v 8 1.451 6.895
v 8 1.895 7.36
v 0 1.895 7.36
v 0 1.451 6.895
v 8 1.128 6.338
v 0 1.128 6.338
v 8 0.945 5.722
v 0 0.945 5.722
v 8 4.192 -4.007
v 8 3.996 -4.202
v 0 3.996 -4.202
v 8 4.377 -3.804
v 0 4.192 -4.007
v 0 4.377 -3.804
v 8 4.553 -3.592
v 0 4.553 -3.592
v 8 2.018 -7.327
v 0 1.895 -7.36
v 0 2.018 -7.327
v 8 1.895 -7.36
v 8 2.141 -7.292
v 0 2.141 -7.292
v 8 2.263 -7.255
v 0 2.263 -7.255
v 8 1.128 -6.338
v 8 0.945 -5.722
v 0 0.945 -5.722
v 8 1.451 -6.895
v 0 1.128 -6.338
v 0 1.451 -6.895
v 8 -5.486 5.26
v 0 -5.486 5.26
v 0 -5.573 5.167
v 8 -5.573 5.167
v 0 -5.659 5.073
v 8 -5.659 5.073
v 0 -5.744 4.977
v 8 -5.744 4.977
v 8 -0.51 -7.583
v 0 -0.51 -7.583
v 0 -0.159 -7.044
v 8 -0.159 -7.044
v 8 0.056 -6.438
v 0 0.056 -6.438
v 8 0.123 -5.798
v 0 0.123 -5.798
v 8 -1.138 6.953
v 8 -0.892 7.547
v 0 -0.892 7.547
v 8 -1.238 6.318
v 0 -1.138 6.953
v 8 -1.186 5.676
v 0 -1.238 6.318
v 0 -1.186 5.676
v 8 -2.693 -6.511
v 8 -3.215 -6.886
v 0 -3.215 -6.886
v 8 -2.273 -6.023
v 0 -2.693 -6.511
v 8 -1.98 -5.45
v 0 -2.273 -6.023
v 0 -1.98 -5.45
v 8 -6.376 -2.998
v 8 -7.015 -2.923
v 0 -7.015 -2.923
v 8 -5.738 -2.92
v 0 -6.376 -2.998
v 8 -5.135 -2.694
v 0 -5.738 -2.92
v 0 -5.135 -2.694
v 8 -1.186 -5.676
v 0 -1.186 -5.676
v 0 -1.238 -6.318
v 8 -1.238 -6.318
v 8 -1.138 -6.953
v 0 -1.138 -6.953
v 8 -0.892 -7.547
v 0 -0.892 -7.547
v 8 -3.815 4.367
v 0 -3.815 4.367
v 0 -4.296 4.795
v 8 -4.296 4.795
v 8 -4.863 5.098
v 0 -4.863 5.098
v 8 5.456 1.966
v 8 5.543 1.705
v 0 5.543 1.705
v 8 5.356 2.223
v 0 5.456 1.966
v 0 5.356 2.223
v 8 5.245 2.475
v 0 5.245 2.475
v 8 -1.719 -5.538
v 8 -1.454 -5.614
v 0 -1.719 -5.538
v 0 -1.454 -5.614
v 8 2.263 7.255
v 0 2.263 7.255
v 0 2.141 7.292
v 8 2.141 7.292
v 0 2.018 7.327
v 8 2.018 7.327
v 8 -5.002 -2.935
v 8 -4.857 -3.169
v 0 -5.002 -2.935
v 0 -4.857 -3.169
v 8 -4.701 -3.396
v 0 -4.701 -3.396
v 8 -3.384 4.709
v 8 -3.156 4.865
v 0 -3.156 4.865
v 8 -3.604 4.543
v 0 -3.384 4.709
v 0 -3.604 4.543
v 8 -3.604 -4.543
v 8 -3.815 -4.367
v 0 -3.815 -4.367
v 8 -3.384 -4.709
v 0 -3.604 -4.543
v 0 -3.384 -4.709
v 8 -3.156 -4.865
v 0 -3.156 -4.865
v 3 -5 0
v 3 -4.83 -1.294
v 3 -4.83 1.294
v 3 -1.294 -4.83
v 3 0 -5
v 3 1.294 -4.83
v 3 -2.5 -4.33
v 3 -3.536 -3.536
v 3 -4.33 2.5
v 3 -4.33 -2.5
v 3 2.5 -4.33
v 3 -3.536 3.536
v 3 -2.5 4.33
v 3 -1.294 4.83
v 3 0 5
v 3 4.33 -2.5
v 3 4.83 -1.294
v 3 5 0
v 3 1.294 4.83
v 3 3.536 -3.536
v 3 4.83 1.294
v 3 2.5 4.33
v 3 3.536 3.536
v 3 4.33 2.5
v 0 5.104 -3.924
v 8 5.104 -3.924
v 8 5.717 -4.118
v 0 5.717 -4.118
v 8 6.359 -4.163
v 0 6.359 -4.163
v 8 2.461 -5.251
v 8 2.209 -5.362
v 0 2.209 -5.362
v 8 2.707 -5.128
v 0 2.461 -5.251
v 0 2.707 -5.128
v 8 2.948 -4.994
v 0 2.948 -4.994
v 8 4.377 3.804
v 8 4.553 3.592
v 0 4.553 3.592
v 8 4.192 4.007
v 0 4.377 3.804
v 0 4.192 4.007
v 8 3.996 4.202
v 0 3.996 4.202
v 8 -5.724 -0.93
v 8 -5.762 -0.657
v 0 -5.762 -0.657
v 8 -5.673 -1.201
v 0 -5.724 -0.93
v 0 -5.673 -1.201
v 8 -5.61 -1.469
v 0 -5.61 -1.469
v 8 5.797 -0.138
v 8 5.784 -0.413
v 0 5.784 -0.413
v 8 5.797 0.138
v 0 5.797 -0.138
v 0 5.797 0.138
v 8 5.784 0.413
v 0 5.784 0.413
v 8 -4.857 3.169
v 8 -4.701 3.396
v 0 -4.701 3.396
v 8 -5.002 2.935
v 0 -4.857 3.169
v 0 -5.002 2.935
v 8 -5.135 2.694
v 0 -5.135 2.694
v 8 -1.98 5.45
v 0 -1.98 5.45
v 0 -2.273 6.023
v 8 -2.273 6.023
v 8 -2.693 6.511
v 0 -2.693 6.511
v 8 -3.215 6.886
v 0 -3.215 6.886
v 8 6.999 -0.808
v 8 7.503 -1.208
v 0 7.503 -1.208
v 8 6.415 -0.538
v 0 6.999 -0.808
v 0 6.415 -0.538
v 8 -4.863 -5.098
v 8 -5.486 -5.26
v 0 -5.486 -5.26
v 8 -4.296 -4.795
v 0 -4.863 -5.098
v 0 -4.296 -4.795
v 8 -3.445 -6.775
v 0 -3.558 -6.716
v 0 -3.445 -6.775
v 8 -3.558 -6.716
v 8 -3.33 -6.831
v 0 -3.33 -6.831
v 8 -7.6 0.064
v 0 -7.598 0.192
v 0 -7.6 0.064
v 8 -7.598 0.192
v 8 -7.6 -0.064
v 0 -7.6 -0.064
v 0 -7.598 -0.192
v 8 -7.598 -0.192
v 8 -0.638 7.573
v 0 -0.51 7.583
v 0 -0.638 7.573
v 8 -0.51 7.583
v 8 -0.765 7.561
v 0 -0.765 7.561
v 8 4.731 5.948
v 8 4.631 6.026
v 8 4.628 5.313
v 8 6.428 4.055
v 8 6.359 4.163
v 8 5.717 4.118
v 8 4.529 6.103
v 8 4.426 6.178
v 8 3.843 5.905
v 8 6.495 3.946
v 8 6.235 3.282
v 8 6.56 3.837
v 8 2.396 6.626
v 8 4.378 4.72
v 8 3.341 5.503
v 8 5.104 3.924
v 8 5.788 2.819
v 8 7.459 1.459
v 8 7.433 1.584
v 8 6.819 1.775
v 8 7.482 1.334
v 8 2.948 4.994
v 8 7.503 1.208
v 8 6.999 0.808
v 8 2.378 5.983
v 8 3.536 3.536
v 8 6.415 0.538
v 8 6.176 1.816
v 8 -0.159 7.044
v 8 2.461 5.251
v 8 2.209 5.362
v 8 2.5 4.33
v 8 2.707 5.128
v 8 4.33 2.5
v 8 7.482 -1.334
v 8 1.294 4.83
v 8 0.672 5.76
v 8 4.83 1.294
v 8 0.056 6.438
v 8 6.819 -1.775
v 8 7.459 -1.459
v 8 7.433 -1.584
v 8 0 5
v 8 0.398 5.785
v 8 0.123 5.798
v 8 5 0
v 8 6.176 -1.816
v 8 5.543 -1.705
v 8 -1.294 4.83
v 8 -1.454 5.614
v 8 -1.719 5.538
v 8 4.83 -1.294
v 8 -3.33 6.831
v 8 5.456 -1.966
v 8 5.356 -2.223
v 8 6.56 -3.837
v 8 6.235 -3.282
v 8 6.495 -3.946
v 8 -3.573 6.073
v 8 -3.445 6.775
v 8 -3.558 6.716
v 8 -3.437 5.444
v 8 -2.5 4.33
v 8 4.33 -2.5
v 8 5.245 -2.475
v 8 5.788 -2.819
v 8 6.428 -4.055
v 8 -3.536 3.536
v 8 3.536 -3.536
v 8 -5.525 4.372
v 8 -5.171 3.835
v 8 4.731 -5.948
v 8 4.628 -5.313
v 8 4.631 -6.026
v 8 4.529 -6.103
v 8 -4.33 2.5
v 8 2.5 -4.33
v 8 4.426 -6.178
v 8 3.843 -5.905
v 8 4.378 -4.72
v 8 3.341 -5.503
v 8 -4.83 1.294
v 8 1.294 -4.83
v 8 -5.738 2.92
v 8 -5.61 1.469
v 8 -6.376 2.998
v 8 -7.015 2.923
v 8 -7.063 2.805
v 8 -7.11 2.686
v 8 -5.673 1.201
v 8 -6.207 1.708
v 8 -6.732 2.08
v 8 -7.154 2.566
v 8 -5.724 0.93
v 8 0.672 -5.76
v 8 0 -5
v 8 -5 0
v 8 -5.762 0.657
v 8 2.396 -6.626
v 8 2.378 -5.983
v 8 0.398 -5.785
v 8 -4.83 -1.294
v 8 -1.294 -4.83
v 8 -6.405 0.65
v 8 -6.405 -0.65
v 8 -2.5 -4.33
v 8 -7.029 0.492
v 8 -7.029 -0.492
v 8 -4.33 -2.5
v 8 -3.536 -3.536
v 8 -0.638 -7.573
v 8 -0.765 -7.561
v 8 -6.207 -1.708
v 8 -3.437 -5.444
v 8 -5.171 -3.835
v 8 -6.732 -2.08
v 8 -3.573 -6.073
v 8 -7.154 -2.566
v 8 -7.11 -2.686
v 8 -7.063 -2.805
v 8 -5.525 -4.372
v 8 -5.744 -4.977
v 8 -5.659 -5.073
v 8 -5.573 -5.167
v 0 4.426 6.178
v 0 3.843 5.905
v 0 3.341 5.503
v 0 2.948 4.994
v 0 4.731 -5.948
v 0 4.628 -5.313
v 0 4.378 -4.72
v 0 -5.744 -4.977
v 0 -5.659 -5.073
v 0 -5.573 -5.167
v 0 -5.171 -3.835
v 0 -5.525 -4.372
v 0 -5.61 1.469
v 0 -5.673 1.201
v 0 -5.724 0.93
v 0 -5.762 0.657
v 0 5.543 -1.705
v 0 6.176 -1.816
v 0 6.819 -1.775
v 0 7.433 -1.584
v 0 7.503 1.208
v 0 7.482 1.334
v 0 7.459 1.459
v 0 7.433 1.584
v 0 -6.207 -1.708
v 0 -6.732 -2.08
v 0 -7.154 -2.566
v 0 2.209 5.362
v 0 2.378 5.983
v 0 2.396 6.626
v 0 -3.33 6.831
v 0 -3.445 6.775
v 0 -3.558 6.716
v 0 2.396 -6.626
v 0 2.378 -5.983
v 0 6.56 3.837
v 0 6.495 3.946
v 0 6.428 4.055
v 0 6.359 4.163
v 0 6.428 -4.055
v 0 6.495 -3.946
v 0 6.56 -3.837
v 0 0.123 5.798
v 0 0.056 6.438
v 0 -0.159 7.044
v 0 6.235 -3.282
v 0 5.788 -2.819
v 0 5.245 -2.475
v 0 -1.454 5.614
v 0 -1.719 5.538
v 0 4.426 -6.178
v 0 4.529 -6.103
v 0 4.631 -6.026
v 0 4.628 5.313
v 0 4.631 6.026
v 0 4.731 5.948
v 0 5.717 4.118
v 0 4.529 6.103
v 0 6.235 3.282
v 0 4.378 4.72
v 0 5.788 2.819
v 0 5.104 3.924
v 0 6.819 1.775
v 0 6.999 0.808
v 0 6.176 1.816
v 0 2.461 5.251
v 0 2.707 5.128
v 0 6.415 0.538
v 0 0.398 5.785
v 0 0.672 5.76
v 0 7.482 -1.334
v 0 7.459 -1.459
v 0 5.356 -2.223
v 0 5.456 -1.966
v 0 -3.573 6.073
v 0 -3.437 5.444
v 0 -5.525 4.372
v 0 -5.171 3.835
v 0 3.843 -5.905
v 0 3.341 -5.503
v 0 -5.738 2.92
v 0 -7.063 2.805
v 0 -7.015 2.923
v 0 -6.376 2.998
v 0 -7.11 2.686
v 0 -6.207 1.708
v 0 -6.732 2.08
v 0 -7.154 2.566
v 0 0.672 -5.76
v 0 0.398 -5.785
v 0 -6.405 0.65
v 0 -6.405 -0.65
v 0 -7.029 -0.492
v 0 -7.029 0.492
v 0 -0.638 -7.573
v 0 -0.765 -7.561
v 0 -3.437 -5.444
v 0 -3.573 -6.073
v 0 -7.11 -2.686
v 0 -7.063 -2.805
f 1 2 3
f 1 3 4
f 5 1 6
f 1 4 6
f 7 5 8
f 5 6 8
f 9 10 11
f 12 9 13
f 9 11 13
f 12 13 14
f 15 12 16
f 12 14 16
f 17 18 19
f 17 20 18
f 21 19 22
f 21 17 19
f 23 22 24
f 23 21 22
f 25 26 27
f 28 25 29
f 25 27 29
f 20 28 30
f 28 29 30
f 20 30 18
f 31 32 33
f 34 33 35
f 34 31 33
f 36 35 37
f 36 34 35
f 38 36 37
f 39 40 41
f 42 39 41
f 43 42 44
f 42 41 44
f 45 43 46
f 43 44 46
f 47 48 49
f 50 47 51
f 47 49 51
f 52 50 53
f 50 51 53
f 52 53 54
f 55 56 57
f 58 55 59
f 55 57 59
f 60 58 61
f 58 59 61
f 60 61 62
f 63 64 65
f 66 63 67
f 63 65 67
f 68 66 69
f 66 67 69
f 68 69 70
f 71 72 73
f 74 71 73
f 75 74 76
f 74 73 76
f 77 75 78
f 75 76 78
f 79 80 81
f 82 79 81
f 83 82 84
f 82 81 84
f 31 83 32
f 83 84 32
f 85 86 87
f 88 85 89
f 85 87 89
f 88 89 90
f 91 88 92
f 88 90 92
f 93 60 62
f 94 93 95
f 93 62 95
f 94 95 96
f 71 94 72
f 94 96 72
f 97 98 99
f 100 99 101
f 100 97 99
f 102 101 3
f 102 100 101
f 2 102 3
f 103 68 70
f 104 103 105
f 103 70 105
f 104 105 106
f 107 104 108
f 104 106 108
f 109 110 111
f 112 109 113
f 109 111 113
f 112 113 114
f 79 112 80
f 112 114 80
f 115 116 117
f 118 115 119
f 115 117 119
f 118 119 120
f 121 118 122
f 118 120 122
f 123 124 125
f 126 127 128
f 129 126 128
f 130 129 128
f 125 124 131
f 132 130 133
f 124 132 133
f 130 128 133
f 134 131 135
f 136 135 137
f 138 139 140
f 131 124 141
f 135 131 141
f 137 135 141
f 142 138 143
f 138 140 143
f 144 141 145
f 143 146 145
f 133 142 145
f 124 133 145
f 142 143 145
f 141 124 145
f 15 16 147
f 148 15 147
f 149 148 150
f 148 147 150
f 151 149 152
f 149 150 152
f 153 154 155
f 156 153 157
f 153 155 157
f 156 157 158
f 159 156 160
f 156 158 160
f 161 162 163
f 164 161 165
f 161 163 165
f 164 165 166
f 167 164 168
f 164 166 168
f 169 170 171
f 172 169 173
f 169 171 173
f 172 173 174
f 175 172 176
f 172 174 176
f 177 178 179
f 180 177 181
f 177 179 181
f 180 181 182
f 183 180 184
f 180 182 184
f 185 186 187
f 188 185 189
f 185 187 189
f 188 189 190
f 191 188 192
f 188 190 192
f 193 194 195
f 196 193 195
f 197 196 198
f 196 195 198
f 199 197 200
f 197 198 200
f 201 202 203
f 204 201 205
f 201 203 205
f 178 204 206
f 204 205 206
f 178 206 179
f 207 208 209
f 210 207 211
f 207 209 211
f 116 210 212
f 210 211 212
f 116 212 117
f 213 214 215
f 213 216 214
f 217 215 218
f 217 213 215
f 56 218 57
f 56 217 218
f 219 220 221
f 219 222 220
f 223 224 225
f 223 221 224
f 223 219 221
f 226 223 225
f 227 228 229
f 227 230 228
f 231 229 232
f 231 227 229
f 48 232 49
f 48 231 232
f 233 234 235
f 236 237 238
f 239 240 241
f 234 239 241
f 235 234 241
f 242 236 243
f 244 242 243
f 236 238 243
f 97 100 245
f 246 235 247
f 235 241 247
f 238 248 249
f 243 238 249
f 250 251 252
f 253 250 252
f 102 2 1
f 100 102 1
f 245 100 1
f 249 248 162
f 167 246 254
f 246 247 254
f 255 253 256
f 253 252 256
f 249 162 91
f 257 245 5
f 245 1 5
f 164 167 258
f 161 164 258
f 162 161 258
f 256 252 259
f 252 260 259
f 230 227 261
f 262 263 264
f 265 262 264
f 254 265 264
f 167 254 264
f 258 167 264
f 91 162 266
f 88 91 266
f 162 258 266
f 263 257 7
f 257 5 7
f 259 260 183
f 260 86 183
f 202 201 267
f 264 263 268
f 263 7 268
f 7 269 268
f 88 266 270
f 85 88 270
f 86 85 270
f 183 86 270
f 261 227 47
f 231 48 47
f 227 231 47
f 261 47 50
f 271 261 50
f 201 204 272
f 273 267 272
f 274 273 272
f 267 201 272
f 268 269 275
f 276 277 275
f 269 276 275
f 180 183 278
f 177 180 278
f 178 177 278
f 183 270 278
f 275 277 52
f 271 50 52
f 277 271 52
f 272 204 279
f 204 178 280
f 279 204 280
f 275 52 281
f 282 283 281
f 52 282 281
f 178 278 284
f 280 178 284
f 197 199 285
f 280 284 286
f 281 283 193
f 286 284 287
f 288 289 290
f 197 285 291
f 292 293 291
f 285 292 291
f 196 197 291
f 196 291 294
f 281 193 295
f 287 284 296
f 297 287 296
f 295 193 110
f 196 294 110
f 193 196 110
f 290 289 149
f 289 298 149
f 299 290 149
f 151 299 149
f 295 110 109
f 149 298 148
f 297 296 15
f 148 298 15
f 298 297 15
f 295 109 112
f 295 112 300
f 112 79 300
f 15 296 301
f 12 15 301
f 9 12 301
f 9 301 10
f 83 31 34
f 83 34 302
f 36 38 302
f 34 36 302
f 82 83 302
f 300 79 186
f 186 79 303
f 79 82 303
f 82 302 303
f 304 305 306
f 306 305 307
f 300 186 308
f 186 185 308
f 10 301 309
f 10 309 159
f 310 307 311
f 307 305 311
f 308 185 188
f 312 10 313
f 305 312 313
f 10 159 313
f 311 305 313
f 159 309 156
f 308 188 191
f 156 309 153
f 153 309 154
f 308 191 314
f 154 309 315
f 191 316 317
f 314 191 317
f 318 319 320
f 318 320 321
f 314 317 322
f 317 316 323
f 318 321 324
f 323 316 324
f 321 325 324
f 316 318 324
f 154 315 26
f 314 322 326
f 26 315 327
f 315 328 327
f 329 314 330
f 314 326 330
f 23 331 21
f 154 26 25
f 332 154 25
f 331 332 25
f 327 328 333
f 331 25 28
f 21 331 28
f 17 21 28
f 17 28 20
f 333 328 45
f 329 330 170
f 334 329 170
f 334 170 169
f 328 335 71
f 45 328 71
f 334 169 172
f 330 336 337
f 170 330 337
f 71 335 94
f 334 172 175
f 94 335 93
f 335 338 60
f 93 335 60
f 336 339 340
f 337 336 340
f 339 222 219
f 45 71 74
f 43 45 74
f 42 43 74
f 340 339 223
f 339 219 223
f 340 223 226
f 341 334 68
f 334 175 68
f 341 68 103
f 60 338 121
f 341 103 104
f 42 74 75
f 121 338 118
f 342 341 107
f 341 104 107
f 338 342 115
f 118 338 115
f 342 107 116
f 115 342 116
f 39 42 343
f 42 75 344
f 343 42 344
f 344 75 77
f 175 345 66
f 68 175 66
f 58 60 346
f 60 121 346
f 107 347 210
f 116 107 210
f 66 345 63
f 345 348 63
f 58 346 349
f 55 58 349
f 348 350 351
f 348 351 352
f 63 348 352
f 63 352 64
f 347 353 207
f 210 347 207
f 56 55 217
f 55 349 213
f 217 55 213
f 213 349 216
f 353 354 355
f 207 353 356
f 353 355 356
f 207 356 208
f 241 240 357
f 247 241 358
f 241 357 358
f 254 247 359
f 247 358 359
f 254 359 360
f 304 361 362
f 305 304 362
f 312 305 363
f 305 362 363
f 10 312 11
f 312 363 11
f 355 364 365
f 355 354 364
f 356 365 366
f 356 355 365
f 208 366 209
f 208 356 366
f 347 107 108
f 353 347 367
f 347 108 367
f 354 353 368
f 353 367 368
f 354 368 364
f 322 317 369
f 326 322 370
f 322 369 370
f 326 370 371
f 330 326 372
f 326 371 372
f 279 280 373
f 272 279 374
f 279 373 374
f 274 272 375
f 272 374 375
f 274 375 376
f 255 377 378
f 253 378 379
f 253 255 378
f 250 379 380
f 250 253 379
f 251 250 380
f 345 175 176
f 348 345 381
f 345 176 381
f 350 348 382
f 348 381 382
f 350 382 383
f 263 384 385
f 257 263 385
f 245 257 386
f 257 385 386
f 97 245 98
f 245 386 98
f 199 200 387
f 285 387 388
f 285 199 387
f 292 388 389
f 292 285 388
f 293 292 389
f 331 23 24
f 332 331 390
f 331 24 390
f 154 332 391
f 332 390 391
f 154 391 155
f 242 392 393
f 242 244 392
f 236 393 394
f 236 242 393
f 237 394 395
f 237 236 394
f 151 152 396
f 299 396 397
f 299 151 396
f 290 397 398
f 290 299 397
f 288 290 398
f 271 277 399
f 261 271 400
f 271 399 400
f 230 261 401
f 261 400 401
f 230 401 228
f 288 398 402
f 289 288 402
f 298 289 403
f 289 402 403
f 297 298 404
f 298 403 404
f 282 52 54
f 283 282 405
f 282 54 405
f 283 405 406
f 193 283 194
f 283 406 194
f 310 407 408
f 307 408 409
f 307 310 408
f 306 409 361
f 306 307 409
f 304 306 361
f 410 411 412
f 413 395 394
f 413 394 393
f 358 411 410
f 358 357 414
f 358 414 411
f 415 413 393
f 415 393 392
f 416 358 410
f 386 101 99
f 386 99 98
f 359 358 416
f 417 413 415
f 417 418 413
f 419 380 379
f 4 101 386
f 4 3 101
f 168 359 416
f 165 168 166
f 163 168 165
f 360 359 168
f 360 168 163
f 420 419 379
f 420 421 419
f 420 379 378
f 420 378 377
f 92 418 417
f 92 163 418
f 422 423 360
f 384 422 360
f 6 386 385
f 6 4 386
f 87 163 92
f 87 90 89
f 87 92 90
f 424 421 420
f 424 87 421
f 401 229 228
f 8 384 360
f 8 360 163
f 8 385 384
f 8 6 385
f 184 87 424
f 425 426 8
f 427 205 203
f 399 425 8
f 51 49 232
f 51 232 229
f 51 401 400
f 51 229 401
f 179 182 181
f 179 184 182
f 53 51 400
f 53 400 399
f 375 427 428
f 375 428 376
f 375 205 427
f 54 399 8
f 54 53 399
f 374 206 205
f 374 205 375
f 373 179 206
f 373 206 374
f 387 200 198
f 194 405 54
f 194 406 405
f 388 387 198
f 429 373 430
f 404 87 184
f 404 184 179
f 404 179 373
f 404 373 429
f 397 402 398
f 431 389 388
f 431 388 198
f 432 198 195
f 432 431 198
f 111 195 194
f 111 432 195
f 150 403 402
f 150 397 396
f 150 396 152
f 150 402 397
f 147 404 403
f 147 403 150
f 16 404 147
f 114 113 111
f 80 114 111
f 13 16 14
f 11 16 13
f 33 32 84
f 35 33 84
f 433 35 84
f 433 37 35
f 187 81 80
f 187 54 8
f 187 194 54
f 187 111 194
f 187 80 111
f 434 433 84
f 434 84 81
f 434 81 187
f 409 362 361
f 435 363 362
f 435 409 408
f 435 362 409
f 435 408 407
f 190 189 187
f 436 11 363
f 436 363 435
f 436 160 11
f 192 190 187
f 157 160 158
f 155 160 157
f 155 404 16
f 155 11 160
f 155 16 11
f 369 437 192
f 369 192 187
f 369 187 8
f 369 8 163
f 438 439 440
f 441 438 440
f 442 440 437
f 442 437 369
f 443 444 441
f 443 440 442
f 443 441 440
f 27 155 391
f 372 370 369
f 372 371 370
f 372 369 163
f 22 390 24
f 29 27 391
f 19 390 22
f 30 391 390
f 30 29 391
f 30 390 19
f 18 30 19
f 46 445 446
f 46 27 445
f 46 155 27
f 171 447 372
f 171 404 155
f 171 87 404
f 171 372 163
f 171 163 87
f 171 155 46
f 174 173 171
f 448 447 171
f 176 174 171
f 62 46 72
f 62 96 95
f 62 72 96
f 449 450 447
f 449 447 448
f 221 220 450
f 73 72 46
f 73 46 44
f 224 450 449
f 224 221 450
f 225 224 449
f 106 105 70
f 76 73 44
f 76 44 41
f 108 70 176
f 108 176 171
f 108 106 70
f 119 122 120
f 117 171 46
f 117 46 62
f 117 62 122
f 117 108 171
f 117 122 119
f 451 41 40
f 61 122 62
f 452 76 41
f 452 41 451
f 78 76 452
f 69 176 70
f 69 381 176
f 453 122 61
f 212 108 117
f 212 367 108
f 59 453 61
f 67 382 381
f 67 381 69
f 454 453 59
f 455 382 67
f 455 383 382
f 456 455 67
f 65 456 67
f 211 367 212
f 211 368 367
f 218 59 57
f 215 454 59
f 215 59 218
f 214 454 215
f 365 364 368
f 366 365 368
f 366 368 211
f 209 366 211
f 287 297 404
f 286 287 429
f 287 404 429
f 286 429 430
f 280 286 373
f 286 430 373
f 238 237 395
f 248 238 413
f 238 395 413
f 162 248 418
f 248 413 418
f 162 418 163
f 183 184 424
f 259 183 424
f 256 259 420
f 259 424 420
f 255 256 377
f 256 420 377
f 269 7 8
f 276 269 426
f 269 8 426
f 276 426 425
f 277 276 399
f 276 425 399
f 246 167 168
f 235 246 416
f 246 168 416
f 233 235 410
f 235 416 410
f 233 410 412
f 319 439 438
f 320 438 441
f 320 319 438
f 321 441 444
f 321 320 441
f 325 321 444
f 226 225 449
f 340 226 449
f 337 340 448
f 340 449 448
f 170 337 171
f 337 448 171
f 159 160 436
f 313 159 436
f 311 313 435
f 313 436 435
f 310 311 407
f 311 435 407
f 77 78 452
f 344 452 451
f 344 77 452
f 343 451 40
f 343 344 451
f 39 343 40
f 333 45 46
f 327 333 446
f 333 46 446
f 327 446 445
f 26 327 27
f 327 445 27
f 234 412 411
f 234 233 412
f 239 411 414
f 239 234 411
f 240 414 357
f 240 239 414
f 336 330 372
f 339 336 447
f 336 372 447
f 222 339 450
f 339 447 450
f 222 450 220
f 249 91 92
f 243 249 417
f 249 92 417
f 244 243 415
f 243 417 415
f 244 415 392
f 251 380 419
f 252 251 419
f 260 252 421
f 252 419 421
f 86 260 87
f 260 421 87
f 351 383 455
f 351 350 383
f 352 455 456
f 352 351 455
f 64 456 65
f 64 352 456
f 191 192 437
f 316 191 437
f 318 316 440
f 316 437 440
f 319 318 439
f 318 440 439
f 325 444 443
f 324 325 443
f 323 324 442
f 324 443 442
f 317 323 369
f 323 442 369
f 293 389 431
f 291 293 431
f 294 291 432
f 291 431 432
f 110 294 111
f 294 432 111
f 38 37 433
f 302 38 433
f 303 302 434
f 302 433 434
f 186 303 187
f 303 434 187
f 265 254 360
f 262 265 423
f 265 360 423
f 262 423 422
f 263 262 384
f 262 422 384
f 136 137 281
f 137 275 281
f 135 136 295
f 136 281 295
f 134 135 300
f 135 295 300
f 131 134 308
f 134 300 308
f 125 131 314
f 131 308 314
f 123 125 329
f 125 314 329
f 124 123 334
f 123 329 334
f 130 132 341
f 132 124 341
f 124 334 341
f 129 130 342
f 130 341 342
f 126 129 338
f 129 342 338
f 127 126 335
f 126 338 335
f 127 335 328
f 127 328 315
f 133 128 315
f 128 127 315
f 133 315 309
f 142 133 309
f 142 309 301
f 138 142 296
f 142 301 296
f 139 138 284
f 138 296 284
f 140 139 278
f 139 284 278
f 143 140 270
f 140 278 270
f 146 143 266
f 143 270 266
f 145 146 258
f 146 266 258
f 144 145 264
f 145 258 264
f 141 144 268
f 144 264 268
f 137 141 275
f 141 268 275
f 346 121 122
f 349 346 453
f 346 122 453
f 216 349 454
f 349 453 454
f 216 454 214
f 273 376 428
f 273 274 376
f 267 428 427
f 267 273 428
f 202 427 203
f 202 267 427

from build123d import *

# Parameters (mm, degrees)
BASPROSKE_W         = 8
BASPROSKE_H         = 7.6
TOOTHCUT_DEPTH      = 14.39850738
TEETHCUTS_COUNT     = 17
TEETHCUTS_ANGLE     = 338.823529412
BORSKE_R            = 5
BORE_DEPTH          = 50.0000508
BOSS_EXTRUDE1_START = -3
SKETCH1_R           = 5
BOSS_EXTRUDE1_DEPTH = 3


with BuildPart() as part:
    # BasProSke → Base-Revolve (revolve)
    with BuildSketch(Plane(origin=(0, 0, 0), x_dir=(1, 0, 0), z_dir=(0, 1, 0)), mode=Mode.PRIVATE) as base_revolve_sk:
        with Locations((4, 3.8)):
            Rectangle(BASPROSKE_W, BASPROSKE_H)
    revolve(base_revolve_sk.sketch.rotate(Axis((-10, 0, 0), (1, 0, 0)), 180), axis=Axis((-10, 0, 0), (1, 0, 0)))

    # TooCutSke → ToothCut (cut, through all)
    with BuildSketch(Plane(origin=(0, 0, 0), x_dir=(0, 0, -1), z_dir=(1, 0, 0))):
        with BuildLine():
            ThreePointArc((0.412875903, 5.784283403), (0, 5.799), (-0.412875903, 5.784283403))
            ThreePointArc((-0.412875903, 5.784283403), (-0.662486036, 6.729558143), (-1.230208712, 7.525510726))
            ThreePointArc((-1.230208712, 7.525510726), (0, 7.6254), (1.230208712, 7.525510726))
            ThreePointArc((1.230208712, 7.525510726), (0.662486036, 6.729558143), (0.412875903, 5.784283403))
        make_face()
    toothcut = extrude(amount=TOOTHCUT_DEPTH, mode=Mode.SUBTRACT)

    # TeethCuts: ToothCut ×17 about axis
    teethcuts_axis = Axis((-10, 0, 0), (1, 0, 0))
    for i in range(1, TEETHCUTS_COUNT):
        add(toothcut.rotate(teethcuts_axis, i * TEETHCUTS_ANGLE / (TEETHCUTS_COUNT - 1)), mode=Mode.SUBTRACT)

    # BorSke → Bore (cut, symmetric)
    with BuildSketch(Plane(origin=(0, 0, 0), x_dir=(0, 0, -1), z_dir=(1, 0, 0))):
        with Locations(Location((0, 0, 0), (0, 0, 180))):
            Circle(BORSKE_R)
    extrude(amount=BORE_DEPTH, both=True, mode=Mode.SUBTRACT)

    # Sketch1 → Boss-Extrude1 (add)
    with BuildSketch(Plane.ZY.offset(BOSS_EXTRUDE1_START)):
        Circle(SKETCH1_R)
    extrude(amount=BOSS_EXTRUDE1_DEPTH)


solid = part.part
